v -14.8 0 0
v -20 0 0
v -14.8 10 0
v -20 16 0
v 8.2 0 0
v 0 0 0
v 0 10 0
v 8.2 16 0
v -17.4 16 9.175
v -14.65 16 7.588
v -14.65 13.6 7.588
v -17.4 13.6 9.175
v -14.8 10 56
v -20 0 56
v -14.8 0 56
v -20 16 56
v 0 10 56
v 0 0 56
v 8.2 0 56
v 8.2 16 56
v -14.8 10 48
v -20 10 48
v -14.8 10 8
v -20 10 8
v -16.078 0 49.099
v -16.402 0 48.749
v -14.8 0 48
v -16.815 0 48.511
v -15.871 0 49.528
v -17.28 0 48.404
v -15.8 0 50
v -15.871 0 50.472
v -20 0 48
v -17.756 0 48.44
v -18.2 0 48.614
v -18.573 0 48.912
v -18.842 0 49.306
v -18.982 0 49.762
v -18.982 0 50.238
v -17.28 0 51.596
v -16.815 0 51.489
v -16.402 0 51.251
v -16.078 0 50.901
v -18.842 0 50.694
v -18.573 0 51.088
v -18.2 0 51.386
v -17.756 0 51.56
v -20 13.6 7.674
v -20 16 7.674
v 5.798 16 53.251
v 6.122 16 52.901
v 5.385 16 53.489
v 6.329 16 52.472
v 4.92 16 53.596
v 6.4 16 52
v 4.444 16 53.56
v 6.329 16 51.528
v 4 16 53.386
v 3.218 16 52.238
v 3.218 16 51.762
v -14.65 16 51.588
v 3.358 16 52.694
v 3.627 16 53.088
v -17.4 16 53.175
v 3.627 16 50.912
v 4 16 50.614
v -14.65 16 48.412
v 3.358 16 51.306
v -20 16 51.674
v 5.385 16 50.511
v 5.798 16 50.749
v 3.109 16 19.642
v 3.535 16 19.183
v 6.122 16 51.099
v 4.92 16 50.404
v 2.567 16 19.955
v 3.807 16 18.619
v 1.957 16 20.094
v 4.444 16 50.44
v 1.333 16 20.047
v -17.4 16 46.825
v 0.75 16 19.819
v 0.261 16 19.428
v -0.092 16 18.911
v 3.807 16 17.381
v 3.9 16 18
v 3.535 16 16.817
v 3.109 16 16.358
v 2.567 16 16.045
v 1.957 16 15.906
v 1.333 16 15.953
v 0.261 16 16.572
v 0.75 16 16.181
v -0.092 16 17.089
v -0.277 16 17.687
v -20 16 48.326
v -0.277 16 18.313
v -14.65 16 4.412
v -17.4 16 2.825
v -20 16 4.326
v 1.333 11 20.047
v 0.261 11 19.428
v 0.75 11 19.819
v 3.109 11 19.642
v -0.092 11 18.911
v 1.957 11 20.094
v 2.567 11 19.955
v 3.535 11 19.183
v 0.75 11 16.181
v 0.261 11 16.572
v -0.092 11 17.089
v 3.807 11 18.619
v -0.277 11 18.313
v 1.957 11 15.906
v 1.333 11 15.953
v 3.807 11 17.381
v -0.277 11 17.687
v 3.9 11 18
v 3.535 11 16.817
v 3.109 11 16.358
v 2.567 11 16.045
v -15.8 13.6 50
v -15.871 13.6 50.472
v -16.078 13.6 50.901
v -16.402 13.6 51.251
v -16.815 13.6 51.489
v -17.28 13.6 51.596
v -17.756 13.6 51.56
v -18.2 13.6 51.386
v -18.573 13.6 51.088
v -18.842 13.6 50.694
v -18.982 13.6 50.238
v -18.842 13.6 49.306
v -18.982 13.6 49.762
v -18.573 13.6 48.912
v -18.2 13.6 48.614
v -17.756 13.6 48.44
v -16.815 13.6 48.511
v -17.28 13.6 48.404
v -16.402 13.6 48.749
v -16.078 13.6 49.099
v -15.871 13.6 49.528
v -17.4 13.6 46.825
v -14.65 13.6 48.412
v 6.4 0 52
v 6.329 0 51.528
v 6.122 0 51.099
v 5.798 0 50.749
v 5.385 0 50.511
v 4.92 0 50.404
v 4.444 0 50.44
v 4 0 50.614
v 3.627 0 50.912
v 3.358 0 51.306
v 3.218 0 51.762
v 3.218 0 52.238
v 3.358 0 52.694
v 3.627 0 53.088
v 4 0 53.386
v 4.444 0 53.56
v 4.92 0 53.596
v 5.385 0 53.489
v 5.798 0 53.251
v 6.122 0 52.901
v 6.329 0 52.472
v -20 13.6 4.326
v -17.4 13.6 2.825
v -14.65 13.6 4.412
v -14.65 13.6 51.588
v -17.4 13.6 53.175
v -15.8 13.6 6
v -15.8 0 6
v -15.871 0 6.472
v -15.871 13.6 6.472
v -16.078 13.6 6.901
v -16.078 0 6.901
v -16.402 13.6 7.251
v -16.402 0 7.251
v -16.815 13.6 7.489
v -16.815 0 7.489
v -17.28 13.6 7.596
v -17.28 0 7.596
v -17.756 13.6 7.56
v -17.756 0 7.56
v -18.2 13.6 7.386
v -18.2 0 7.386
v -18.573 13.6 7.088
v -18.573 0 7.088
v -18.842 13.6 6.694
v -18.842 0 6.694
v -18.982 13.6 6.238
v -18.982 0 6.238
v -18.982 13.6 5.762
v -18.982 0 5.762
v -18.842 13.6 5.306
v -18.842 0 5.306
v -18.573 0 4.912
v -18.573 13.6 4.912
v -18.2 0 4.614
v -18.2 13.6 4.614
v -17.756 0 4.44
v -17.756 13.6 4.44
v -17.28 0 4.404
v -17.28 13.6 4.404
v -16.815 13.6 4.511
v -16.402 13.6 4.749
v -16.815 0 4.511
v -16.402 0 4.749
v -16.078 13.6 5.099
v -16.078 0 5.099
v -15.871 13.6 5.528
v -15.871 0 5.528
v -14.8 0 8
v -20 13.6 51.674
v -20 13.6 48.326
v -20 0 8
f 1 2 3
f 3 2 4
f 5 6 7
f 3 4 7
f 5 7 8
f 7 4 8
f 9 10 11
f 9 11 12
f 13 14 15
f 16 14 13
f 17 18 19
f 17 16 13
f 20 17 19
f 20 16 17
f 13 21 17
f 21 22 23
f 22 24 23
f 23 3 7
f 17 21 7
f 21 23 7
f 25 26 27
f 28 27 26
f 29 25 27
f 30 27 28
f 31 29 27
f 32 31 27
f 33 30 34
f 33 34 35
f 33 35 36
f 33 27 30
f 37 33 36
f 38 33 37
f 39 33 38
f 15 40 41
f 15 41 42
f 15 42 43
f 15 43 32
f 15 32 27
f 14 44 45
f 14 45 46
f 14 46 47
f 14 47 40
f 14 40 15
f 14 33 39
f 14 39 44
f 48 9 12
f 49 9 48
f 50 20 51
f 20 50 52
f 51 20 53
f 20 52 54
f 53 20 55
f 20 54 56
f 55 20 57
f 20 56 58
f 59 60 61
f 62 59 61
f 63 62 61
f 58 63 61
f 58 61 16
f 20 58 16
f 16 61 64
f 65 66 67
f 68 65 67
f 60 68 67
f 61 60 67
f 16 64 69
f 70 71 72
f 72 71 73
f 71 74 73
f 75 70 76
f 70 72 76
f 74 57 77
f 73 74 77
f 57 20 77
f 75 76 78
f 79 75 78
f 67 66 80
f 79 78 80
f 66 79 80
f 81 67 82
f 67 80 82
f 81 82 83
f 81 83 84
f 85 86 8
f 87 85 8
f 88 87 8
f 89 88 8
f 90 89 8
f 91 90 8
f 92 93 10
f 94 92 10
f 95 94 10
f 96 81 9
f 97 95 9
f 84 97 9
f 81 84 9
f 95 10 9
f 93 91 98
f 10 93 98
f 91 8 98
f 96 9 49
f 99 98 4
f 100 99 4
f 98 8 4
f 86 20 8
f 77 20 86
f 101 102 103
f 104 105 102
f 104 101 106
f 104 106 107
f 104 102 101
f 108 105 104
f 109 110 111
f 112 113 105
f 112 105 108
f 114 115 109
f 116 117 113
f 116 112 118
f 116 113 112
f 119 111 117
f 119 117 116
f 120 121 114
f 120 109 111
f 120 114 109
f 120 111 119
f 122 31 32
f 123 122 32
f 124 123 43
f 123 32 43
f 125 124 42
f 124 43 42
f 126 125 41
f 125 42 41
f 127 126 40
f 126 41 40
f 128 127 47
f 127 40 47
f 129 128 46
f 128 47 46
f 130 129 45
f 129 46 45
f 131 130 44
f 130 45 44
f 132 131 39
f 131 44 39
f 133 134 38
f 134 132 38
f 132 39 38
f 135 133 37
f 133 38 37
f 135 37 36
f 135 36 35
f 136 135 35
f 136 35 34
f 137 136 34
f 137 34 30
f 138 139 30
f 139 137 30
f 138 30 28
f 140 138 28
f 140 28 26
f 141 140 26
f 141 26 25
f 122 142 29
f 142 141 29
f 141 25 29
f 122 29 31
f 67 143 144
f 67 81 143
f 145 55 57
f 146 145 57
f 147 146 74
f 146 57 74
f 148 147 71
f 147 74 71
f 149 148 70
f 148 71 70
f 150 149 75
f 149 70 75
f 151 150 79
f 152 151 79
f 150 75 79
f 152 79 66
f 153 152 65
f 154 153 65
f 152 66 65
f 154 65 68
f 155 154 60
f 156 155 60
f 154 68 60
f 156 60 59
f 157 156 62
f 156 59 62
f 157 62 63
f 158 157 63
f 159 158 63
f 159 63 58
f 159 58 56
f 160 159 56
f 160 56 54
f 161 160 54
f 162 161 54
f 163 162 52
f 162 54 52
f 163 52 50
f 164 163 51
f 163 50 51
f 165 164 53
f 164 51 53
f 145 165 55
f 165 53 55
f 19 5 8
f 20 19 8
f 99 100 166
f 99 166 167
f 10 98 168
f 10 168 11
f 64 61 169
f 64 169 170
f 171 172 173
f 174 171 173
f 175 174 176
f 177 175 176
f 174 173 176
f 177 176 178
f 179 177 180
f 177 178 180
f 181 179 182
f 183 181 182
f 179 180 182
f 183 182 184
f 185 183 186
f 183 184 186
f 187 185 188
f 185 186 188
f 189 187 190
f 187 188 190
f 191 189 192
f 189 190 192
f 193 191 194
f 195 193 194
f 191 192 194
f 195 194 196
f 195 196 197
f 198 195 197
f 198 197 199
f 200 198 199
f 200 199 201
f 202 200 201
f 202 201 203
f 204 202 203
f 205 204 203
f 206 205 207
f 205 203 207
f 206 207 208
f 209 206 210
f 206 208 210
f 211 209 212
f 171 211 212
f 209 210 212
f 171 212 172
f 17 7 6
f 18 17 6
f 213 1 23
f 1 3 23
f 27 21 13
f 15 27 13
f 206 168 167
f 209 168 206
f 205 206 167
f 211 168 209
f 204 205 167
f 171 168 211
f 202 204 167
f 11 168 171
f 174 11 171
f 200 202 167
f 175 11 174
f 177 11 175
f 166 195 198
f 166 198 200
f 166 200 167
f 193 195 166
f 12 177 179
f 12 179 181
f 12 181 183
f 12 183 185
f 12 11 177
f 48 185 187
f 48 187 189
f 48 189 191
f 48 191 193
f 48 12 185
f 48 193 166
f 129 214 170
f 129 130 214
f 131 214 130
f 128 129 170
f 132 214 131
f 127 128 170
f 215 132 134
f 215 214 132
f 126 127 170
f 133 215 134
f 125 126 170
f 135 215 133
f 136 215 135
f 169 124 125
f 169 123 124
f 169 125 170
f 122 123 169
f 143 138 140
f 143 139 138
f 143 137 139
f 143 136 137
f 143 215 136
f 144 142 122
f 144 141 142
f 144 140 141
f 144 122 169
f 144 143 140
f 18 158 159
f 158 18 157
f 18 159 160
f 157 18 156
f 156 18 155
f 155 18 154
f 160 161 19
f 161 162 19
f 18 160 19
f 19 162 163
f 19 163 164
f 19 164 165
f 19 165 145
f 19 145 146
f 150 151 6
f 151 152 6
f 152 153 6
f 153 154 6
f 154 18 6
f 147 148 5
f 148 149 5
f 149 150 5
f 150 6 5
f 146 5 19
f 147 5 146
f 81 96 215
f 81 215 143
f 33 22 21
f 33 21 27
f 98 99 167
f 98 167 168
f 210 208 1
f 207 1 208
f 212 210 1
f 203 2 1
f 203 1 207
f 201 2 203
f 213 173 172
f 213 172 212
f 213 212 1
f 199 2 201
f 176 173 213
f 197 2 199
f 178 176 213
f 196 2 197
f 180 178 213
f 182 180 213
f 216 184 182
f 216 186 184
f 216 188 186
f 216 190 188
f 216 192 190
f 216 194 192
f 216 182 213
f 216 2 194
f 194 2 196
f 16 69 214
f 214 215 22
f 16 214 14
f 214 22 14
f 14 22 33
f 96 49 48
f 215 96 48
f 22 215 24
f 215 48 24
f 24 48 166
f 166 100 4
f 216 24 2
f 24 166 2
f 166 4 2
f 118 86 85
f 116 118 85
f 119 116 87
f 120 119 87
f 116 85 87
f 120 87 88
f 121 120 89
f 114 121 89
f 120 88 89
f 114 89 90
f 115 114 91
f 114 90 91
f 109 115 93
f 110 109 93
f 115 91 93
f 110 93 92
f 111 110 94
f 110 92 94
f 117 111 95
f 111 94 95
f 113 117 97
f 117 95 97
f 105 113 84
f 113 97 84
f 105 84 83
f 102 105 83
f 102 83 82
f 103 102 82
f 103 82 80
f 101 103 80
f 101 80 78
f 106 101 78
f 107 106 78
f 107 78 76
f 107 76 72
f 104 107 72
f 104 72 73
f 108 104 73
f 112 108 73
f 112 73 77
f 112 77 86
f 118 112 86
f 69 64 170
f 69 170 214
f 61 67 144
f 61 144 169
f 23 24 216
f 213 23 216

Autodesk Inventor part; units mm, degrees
ref_plane "YZ Plane" through (0, 0, 0) normal (1, 0, 0) x (0, 1, 0)
ref_plane "XZ Plane" through (0, 0, 0) normal (0, 1, 0) x (-1, 0, 0)
ref_plane "XY Plane" through (0, 0, 0) normal (0, 0, 1) x (1, 0, 0)
sketch "Эскиз1" plane through (0, 0, 0) normal (0, 0, 1) x (1, 0, 0)
  line L0 (0, 0) -> (-20, 0) construction
  line L1 (-20, 0) -> (-20, 10) construction
  line L2 (-20, 10) -> (0, 10) construction
  line L3 (0, 10) -> (0, 0) construction
  line L4 (-20, 0) -> (8.2, 0) construction
  line L5 (8.2, 0) -> (8.2, 16)
  line L6 (8.2, 16) -> (-20, 16)
  line L7 (-20, 16) -> (-20, 0) construction
  line L8 (-20, 16) -> (-20, 10)
  line L9 (-20, 10) -> (0, 10)
  line L10 (0, 10) -> (0, 0)
  line L11 (0, 0) -> (8.2, 0)
  point P0 (-10, 10)
  dimension "d0" = 20
  dimension "d1" = 10
  dimension "d2" = 6
  dimension "d3" = 8.2
extrude "Выдавливание1" add sketch "Эскиз1" along normal blind 56
sketch "Эскиз5" plane through (-20, 10, 0) normal (-1, 0, 0) x (0, 0, 1)
  line L0 (0, 0) -> (56, 0) projected
  line L1 (0, -10) -> (56, -10) projected
  line L2 (56, 0) -> (48, 0)
  line L3 (48, 0) -> (48, -10)
  line L4 (48, -10) -> (56, -10)
  line L5 (56, -10) -> (56, 0)
  line L6 (0, 0) -> (8, 0)
  line L7 (8, 0) -> (8, -10)
  line L8 (8, -10) -> (0, -10)
  line L9 (0, -10) -> (0, 0)
  point P0 (48, 0)
  point P1 (8, -10)
  point P2 (8, 0)
  dimension "d37" = 8
  dimension "d38" = 8
extrude "Выдавливание5" add sketch "Эскиз5" against normal blind 5.2 contours L0 L7 L1 L9 | L0 L5 L1 L3
sketch "Эскиз6" plane through (-20, 0, 48) normal (0, -1, 0) x (1, 0, 0)
  line L0 (0, 0) -> (0, 8) projected
  line L1 (0, 0) -> (5.2, 0) projected
  line L2 (5.2, 8) -> (5.2, 0) projected
  line L3 (0, 8) -> (5.2, 8) projected
  circle A0 centre (2.6, 2) radius 1.6
  line L4 (2.6, 2) -> (5.2, 4)
  line L5 (2.6, 2) -> (0, 4)
  line L6 (0, 0) -> (0, 8) projected
  point P0 (20, -48)
  dimension "d41" = 3.2
  dimension "d45" = 6
extrude "Выдавливание6" cut sketch "Эскиз6" against normal blind 20 contours L5 L4 A0 | A0 L4 L5
sketch "Эскиз7" plane through (-20, 16, 0) normal (0, 1, 0) x (1, 0, 0)
  circle A0 centre (2.6, -50) radius 1.6 projected
  line L0 (5.35, -48.4123) -> (5.35, -51.5877)
  line L1 (5.35, -51.5877) -> (2.6, -53.1754)
  line L2 (2.6, -53.1754) -> (-0.15, -51.5877)
  line L3 (-0.15, -51.5877) -> (-0.15, -48.4123)
  line L4 (-0.15, -48.4123) -> (2.6, -46.8246)
  line L5 (2.6, -46.8246) -> (5.35, -48.4123)
  line L6 (0, 0) -> (0, -56) projected
  point P0 (20, 0)
  point P1 (0, -48.3257)
  point P2 (0, -51.6743)
  dimension "d44" = 5.5
extrude "Выдавливание7" cut sketch "Эскиз7" against normal blind 2.4 contours L0 L1 L2 L6 L4 L5
ref_plane "РабПлоскость1" through (0, 0, 28) normal (0, 0, 1) x (1, 0, 0)
mirror "Зеркальное отражение1" about plane through (0, 0, 28) normal (0, 0, 1) of "Выдавливание6", "Выдавливание7"
sketch "Эскиз8" plane through (-20, 16, 0) normal (0, 1, 0) x (1, 0, 0)
  circle A0 centre (24.8, -52) radius 1.6
  circle A1 centre (24.8, -18) radius 1.6 construction
  line L0 (24.8, -52) -> (24.8, -18)
  line L1 (28.2, 0) -> (28.2, -56) projected
  line L2 (0, -7.6743) -> (0, -48.3257) projected
  line L3 (28.2, -56) -> (0, -56) projected
  point P0 (20, 0)
  dimension "d49" = 3.2
  dimension "d50" = 3.2
  dimension "d51" = 34
  dimension "d52" = 24.8
  dimension "d53" = 4
extrude "Выдавливание8" cut sketch "Эскиз8" against normal blind 56
sketch "Эскиз9" plane through (-20, 16, 0) normal (0, 1, 0) x (1, 0, 0)
  circle A0 centre (9.8, 137.0813) radius 6 projected
  line L0 (15.8, 137.0813) -> (15.8, -29.0562) construction
  circle A1 centre (21.8, -18) radius 6 construction
  circle A2 centre (21.8, -18) radius 2.1
  point P0 (20, 0)
  dimension "d56" = 12
  dimension "d57" = 18
  dimension "d58" = 4.2
extrude "Выдавливание9" cut sketch "Эскиз9" against normal blind 5 contours A2
equation "\"Радиус_гибки\" = Толщина"
equation "\"Ширина_просечки\" = Толщина"
equation "\"Глубина_просечки\" = 0.5 * Толщина"
equation "\"Размер_просечки\" = 4 * Толщина"
equation "\"Мин_остаток\" = 2 * Толщина"
equation "\"Радиус_перехода\" = Радиус_гибки"
equation "\"Радиус_Якоби\" = Радиус_гибки"
equation "\"Размер_зазора\" = Толщина"
equation "\"Толщина\" = 3.048"
properties part number "креп_центр_м2" material "Полипропилен"
